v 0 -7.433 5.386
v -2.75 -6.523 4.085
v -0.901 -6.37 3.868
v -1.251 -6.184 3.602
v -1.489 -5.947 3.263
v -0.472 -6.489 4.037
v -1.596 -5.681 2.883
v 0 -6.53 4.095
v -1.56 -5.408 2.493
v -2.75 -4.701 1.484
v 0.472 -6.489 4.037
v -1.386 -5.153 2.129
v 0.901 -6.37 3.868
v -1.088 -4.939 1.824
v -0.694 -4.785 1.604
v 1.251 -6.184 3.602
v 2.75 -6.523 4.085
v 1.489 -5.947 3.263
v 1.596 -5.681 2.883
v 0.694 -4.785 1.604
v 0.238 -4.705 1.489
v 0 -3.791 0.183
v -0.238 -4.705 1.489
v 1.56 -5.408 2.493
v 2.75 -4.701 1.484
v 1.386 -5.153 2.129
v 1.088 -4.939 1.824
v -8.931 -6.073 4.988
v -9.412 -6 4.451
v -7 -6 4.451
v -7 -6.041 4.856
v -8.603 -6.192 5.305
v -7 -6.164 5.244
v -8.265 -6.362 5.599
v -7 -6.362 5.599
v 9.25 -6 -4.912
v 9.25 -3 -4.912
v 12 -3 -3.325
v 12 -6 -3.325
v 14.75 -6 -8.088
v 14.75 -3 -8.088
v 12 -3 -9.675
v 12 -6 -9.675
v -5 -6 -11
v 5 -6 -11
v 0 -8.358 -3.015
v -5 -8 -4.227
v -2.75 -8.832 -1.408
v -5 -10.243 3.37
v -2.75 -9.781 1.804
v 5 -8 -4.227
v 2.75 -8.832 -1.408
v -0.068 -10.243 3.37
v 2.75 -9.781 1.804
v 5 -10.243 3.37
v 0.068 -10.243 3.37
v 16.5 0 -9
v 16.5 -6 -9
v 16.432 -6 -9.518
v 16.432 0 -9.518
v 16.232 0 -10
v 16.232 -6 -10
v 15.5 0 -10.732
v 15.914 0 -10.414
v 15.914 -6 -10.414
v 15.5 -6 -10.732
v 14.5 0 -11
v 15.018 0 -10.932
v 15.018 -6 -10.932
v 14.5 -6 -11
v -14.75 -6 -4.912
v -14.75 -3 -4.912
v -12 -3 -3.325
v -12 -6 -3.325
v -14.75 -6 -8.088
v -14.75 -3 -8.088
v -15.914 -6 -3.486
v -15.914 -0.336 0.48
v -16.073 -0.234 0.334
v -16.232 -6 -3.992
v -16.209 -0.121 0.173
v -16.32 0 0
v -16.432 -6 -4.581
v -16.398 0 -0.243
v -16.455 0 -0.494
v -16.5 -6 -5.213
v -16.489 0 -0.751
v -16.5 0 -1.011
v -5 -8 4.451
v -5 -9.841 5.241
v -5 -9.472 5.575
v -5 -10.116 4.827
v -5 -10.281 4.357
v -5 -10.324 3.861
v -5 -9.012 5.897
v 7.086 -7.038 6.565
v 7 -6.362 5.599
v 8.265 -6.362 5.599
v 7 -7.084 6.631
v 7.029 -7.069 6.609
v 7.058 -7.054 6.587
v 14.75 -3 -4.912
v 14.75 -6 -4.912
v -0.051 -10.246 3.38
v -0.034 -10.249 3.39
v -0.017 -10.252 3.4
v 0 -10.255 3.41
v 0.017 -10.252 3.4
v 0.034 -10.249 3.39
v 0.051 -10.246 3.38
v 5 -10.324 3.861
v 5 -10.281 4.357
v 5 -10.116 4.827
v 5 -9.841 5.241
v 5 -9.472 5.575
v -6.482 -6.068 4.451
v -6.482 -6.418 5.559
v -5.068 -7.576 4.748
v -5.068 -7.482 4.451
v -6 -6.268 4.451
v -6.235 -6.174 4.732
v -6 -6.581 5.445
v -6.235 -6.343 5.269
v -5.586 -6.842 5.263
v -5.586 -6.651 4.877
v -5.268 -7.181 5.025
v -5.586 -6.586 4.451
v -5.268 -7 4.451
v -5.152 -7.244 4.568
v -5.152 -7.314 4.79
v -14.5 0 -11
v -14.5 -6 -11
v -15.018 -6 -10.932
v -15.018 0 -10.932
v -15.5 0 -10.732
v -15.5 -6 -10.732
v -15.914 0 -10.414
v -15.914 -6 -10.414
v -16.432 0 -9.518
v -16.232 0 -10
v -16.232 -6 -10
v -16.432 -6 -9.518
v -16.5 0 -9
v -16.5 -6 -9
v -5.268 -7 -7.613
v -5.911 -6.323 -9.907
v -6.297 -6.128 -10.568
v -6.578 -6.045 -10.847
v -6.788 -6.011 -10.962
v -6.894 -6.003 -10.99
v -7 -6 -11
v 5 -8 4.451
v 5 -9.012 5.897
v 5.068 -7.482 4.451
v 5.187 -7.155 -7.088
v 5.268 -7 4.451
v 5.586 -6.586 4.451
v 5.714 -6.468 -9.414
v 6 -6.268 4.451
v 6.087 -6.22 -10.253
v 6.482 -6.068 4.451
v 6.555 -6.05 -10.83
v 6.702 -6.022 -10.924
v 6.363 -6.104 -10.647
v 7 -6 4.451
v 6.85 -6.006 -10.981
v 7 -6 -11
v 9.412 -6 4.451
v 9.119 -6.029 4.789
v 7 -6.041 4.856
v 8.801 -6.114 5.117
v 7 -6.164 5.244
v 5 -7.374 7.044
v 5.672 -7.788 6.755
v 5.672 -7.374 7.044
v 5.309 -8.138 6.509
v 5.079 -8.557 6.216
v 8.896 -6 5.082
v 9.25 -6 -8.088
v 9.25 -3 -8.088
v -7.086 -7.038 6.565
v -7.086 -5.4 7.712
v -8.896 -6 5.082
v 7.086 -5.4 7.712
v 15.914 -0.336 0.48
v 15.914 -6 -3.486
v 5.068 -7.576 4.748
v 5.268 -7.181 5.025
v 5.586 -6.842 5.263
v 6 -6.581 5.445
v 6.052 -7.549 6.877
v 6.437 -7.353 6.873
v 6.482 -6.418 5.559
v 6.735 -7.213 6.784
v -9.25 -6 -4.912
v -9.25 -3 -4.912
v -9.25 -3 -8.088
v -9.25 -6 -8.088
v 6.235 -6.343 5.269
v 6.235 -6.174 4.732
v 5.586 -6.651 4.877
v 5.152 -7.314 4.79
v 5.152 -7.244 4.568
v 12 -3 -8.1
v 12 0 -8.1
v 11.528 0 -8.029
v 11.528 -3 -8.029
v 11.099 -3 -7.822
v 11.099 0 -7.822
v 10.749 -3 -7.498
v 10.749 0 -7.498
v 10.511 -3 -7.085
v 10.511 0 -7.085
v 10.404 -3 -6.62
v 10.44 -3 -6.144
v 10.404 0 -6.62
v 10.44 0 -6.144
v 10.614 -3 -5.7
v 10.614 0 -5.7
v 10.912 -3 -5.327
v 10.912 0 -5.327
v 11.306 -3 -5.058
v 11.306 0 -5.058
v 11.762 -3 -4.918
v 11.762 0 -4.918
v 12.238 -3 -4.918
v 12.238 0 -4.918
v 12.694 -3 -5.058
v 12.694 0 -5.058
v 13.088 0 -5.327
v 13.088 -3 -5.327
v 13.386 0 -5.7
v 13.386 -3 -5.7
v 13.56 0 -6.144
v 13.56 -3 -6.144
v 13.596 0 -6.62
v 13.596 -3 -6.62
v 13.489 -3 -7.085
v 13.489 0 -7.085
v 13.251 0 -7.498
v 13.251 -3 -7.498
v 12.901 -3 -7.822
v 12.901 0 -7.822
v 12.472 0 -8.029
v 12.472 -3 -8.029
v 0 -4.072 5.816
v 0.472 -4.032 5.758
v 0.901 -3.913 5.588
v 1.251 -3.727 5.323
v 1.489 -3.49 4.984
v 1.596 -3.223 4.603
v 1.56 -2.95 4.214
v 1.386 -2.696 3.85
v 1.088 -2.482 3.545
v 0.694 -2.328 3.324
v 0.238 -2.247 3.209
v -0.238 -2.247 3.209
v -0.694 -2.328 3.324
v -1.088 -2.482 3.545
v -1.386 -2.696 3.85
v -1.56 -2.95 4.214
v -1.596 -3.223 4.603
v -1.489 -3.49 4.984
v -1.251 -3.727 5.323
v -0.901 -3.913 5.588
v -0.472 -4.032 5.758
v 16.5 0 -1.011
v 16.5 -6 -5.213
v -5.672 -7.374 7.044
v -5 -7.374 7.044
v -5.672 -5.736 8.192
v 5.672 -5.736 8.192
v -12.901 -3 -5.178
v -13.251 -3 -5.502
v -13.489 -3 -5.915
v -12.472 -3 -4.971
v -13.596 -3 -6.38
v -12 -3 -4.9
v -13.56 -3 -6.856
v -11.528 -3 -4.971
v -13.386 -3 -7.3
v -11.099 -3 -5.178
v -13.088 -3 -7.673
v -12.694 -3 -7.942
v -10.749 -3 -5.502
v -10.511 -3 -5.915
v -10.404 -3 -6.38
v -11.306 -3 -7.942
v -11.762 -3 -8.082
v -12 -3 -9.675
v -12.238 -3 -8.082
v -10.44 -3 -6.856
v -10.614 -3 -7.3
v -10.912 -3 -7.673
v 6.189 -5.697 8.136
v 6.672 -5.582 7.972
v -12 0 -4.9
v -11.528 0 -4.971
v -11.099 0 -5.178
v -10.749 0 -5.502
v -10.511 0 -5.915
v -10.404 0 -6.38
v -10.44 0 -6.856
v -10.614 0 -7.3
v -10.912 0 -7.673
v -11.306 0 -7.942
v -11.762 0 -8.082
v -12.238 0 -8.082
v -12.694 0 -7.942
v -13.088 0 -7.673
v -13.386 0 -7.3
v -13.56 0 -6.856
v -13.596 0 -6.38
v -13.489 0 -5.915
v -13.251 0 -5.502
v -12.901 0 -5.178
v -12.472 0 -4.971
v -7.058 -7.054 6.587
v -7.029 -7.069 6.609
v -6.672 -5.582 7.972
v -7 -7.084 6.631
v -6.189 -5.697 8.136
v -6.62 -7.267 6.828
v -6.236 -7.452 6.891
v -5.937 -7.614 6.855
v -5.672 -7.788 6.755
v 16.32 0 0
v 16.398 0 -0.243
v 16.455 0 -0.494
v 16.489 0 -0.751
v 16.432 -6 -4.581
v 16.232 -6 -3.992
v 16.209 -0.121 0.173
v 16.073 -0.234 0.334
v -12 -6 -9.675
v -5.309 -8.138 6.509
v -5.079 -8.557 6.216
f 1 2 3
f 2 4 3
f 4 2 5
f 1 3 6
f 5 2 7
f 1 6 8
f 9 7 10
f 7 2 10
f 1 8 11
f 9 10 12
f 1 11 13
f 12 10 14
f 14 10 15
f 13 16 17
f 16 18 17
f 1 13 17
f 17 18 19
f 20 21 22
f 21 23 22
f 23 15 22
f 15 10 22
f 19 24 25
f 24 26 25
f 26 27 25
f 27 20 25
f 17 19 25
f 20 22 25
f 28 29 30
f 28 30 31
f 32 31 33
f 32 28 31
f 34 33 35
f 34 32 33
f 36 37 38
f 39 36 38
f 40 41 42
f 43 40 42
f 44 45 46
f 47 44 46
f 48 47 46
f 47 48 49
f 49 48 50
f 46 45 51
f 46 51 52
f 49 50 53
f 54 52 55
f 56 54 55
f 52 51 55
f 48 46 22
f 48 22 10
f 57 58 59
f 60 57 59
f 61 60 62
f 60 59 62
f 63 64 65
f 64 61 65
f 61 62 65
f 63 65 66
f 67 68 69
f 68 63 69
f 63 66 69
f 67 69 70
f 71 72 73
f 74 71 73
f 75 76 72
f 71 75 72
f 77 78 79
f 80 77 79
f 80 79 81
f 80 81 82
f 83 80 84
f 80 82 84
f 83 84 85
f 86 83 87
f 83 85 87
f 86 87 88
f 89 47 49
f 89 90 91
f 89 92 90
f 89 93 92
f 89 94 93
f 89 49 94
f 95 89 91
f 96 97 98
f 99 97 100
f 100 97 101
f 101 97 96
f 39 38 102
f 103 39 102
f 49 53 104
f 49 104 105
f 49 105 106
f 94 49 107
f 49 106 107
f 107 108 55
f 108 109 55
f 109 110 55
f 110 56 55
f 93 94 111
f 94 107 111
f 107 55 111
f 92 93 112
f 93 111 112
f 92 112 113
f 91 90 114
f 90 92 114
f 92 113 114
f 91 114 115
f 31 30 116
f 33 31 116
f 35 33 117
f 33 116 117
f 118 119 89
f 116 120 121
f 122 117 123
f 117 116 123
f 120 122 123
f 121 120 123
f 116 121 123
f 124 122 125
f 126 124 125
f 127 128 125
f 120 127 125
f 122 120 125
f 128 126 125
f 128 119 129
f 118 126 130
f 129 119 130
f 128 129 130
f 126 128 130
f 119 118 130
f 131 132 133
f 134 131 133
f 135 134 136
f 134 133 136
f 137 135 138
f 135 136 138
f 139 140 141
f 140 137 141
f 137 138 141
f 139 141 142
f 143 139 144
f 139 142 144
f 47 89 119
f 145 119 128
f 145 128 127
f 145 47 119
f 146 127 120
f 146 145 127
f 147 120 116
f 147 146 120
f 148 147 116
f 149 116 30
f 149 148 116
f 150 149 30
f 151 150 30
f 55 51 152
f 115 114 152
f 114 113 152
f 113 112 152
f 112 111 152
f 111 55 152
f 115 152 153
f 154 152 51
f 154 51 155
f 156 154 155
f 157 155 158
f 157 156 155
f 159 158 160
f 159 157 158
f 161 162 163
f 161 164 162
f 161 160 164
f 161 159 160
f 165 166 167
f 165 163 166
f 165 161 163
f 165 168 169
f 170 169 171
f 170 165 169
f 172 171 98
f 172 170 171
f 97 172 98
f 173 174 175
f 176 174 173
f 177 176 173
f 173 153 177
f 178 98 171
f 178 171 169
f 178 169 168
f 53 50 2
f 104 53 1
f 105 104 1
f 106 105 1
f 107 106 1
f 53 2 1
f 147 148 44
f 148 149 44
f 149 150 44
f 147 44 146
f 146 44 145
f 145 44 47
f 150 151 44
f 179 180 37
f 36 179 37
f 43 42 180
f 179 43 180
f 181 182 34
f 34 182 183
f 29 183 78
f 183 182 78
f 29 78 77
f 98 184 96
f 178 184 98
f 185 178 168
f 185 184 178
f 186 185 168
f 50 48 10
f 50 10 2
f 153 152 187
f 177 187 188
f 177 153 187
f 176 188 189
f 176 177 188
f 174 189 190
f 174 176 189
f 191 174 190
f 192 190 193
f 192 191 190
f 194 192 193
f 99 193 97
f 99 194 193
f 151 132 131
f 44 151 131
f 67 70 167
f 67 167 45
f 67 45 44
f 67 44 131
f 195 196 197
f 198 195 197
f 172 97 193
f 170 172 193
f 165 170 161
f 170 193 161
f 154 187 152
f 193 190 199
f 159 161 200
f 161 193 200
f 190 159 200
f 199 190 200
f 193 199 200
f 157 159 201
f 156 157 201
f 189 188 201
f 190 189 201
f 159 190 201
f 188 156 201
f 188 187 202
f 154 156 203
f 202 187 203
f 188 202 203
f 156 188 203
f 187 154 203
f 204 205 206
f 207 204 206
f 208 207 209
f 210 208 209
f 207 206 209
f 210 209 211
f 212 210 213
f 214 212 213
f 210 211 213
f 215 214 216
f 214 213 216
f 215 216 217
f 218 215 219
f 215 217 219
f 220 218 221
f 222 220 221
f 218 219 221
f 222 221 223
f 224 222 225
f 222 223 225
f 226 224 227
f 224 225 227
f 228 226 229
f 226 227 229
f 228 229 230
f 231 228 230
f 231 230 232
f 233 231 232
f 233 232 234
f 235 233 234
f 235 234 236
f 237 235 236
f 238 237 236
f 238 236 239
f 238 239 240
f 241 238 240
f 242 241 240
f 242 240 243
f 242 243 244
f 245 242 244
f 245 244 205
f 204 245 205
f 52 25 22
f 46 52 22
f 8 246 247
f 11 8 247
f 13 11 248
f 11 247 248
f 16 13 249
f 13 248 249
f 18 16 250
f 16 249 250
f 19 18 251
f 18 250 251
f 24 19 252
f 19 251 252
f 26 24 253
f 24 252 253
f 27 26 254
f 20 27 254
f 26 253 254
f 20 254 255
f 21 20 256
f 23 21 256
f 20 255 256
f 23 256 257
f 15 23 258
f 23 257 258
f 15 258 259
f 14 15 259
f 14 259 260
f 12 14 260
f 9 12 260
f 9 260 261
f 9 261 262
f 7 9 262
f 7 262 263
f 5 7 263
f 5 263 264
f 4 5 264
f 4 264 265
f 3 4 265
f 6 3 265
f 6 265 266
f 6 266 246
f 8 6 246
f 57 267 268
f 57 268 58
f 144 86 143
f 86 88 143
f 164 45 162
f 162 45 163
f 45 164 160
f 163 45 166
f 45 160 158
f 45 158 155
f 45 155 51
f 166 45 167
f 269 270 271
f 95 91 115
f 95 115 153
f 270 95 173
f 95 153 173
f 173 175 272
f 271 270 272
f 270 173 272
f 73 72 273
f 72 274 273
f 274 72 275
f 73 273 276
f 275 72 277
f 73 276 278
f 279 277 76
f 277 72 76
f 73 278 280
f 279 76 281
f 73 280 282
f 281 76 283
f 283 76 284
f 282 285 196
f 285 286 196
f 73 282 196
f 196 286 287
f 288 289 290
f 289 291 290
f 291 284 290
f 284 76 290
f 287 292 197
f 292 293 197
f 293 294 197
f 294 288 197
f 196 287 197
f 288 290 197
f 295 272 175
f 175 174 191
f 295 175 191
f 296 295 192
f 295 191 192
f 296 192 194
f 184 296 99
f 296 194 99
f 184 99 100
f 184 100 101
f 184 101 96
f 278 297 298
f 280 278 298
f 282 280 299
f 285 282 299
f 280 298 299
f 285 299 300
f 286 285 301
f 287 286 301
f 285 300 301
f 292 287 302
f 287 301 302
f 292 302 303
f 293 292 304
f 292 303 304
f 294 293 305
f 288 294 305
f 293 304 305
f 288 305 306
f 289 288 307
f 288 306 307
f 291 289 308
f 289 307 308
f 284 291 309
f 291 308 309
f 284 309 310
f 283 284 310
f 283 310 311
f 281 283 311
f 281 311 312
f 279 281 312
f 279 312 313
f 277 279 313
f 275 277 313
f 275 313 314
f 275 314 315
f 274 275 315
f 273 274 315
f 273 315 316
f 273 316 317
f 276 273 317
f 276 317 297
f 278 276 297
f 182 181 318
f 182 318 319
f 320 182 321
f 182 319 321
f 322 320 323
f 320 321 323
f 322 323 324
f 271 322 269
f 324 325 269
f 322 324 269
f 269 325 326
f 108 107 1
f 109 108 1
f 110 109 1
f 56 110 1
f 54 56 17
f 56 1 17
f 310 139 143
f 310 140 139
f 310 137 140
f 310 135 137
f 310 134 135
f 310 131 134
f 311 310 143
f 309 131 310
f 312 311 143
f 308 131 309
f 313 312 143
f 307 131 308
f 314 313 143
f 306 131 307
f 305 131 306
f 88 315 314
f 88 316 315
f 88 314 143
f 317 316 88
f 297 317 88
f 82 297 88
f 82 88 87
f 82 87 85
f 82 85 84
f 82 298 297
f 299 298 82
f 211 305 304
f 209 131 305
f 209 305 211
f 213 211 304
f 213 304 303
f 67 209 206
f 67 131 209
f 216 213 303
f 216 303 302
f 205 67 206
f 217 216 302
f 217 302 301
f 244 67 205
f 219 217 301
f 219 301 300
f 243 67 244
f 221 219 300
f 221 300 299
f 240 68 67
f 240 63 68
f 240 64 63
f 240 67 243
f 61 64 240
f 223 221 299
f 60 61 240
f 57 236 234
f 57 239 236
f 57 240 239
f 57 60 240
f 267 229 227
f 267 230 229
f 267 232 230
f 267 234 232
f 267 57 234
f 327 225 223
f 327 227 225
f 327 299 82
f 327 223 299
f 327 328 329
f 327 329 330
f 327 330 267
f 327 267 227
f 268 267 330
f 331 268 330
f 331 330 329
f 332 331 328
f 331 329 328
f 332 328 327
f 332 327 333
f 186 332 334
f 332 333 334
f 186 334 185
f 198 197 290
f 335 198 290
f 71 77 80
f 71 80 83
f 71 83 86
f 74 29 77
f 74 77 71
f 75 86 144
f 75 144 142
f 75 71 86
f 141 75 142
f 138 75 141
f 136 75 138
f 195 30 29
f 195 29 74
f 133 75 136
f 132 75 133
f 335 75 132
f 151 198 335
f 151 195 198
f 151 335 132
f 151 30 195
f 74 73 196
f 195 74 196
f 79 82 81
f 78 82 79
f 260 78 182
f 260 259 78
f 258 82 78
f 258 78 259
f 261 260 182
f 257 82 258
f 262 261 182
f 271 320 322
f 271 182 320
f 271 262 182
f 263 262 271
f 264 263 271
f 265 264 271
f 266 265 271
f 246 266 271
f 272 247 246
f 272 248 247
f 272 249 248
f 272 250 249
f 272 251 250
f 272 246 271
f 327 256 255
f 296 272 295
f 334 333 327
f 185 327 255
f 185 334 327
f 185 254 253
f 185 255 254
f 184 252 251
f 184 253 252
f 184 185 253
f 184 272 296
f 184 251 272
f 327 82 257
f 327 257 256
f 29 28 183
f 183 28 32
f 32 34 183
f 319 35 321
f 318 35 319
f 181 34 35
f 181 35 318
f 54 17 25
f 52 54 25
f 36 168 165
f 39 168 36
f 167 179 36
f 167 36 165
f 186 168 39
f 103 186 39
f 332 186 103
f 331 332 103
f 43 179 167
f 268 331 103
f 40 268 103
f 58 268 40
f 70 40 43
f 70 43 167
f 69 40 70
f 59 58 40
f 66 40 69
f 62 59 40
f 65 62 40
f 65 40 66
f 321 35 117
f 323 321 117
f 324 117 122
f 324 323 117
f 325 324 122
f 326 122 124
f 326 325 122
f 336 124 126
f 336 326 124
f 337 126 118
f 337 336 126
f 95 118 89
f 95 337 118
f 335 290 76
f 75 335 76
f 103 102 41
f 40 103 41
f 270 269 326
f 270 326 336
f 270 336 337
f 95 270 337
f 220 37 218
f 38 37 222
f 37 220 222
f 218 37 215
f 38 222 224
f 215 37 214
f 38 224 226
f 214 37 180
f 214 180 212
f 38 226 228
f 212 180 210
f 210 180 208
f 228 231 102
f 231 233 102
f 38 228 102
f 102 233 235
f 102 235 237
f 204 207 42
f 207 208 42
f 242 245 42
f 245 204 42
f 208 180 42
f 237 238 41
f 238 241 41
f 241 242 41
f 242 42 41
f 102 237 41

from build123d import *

# Parameters (mm, degrees)
EXTRU_MINCE1_DEPTH      = 16.5
ENL_V_MAT_EXTRU_5_DEPTH = 37.379072455
BOSS_EXTRU_1_DEPTH      = 5
ESQUISSE2_R             = 1.6
ENL_V_MAT_EXTRU_1_DEPTH = 23.509707076
ESQUISSE3_R             = 1.6
ENL_V_MAT_EXTRU_2_DEPTH = 23.509707076
ENL_V_START             = -3
ENL_V_MAT_EXTRU_3_DEPTH = 20.509707076
ENL_V_MAT_EXTRU_4_DEPTH = 20.509707076
CHANFREIN1_SIZE         = 10
CONG_1_R                = 2


with BuildPart() as part:
    # Esquisse1 → Extru.-Mince1 (new, symmetric)
    with BuildSketch(Plane(origin=(0, 0, 0), x_dir=(0, 0, -1), z_dir=(1, 0, 0))):
        Polygon((11, 0), (0, 0), (-8.191520443, -5.735764364), (-4.750061825, -10.650676629), (1.891792733, -6), (11, -6), align=None)
    extrude(amount=EXTRU_MINCE1_DEPTH, both=True)

    # Esquisse7 → Enlèv. mat.-Extru.5 (cut, through all)
    with BuildSketch(Plane.ZY.offset(16.5)):
        Polygon((-1.891792733, -6), (5.081994449, -6), (7.04436757, -7.374068452), (4.750061825, -10.650676629), align=None)
    extrude(amount=-ENL_V_MAT_EXTRU_5_DEPTH, mode=Mode.SUBTRACT)

    # Esquisse6 → Boss.-Extru.1 (add, symmetric)
    with BuildSketch(Plane(origin=(0, 0, 0), x_dir=(0, 0, -1), z_dir=(1, 0, 0))):
        Polygon((1.891792733, -6), (11, -6), (-4.750061825, -10.650676629), (-8.191520443, -5.735764364), (-5.081994449, -6), align=None)
    extrude(amount=BOSS_EXTRU_1_DEPTH, both=True)

    # Esquisse2 → Enlèv. mat.-Extru.1 (cut, through all)
    with BuildSketch(Plane(origin=(0, 0, 0), x_dir=(1, 0, 0), z_dir=(0, 1, 0))):
        with Locations(Location((-12, 6.5, 0), (0, 0, 270))):
            Circle(ESQUISSE2_R)
        with Locations(Location((12, 6.5, 0), (0, 0, 90))):
            Circle(ESQUISSE2_R)
    extrude(amount=-ENL_V_MAT_EXTRU_1_DEPTH, mode=Mode.SUBTRACT)

    # Esquisse3 → Enlèv. mat.-Extru.2 (cut, through all)
    with BuildSketch(Plane(origin=(0, 0, 0), x_dir=(1, 0, 0), z_dir=(0, 0.819152044288991, 0.5735764363510473))):
        with Locations(Location((0, -5.5, 0), (0, 0, 270))):
            Circle(ESQUISSE3_R)
    extrude(amount=-ENL_V_MAT_EXTRU_2_DEPTH, mode=Mode.SUBTRACT)

    # Esquisse4 → Enlèv. mat.-Extru.3 (cut, through all)
    with BuildSketch(Plane(origin=(0, 0, 0), x_dir=(1, 0, 0), z_dir=(0, 1, 0)).offset(ENL_V_START)):
        Polygon((-9.25, 8.08771324), (-12, 9.675426481), (-14.75, 8.08771324), (-14.75, 4.91228676), (-12, 3.324573519), (-9.25, 4.91228676), align=None)
        Polygon((14.75, 8.08771324), (12, 9.675426481), (9.25, 8.08771324), (9.25, 4.91228676), (12, 3.324573519), (14.75, 4.91228676), align=None)
    extrude(amount=-ENL_V_MAT_EXTRU_3_DEPTH, mode=Mode.SUBTRACT)

    # Esquisse5 → Enlèv. mat.-Extru.4 (cut, through all)
    with BuildSketch(Plane(origin=(0, 0, 0), x_dir=(1, 0, 0), z_dir=(0, 0.819152044288991, 0.5735764363510474)).offset(ENL_V_START)):
        Polygon((2.75, -3.91228676), (0, -2.324573519), (-2.75, -3.91228676), (-2.75, -7.08771324), (0, -8.675426481), (2.75, -7.08771324), align=None)
    extrude(amount=-ENL_V_MAT_EXTRU_4_DEPTH, mode=Mode.SUBTRACT)

    # Chanfrein1
    chanfrein1_edges = [part.edges().sort_by_distance(p)[0] for p in [
        (-16.5, -6.554916408, 7.617944007),
        (16.5, -6.554916408, 7.617944007),
    ]]
    chamfer(chanfrein1_edges, length=CHANFREIN1_SIZE)

    # Congé1
    # the kernel refuses this fillet: 2 mm, written as the material it adds along each edge
    with BuildSketch(Plane(origin=(7, -8, 4.451396871), x_dir=(0, 0.819152044288991, 0.5735764363510474), z_dir=(-1, 0, 0))) as cong_1_piece_1_section:
        Polygon((0, 0), (CONG_1_R, 0), (CONG_1_R, CONG_1_R * 0.315298788879), (CONG_1_R * 0.819152044289, CONG_1_R * 0.573576436351), align=None)
    cong_1_piece_1 = extrude(amount=CONG_1_R, mode=Mode.PRIVATE)
    cong_1_piece_1 = cong_1_piece_1 - Plane(origin=(7, -8, 4.451396871), x_dir=(0, -0.9537169507482266, -0.30070579950427384), z_dir=(-1, 0, 0)) * Sphere(CONG_1_R, mode=Mode.PRIVATE)
    add(cong_1_piece_1)
    with BuildSketch(Plane(origin=(-7, -8, 4.451396871), x_dir=(0, 1, 0), z_dir=(1, 0, 0))) as cong_1_piece_2_section:
        Polygon((0, 0), (CONG_1_R, 0), (CONG_1_R, CONG_1_R * 0.315298788879), (CONG_1_R * 0.819152044289, CONG_1_R * 0.573576436351), align=None)
    cong_1_piece_2 = extrude(amount=CONG_1_R, mode=Mode.PRIVATE)
    cong_1_piece_2 = cong_1_piece_2 - Plane(origin=(-7, -8, 4.451396871), x_dir=(0, -0.9537169507482266, -0.30070579950427384), z_dir=(1, 0, 0)) * Sphere(CONG_1_R, mode=Mode.PRIVATE)
    add(cong_1_piece_2)
    with BuildSketch(Plane(origin=(7, -6, 5.081994449), x_dir=(0, 0, -1), z_dir=(1, 0, 0))) as cong_1_piece_3_section:
        with BuildLine():
            CenterArc((CONG_1_R * 0.315298788879, -CONG_1_R), CONG_1_R, 90, 35)
            Line((-CONG_1_R * 0.258277647472, -CONG_1_R * 0.180847955711), (0, 0))
            Line((0, 0), (CONG_1_R * 0.315298788879, 0))
        make_face()
    cong_1_piece_3 = extrude(amount=3.472109184, mode=Mode.PRIVATE)
    cong_1_piece_3 = split(cong_1_piece_3, bisect_by=Plane(origin=(8.435798526, -6.333350621, 5.409912391), z_dir=(-0.7071067811865476, 0.40557978767263964, -0.5792279653395686)), keep=Keep.TOP, mode=Mode.PRIVATE)
    add(cong_1_piece_3)
    with BuildSketch(Plane(origin=(-10.472109184, -6, 5.081994449), x_dir=(0, 0, -1), z_dir=(1, 0, 0))) as cong_1_piece_4_section:
        with BuildLine():
            CenterArc((CONG_1_R * 0.315298788879, -CONG_1_R), CONG_1_R, 90, 35)
            Line((-CONG_1_R * 0.258277647472, -CONG_1_R * 0.180847955711), (0, 0))
            Line((0, 0), (CONG_1_R * 0.315298788879, 0))
        make_face()
    cong_1_piece_4 = extrude(amount=3.472109184, mode=Mode.PRIVATE)
    cong_1_piece_4 = split(cong_1_piece_4, bisect_by=Plane(origin=(-8.435798526, -6.333350621, 5.409912391), z_dir=(0.7071067811865476, 0.40557978767263964, -0.5792279653395686)), keep=Keep.TOP, mode=Mode.PRIVATE)
    add(cong_1_piece_4)
    with BuildSketch(Plane(origin=(-5, -7.374068452, 7.04436757), x_dir=(-1, 0, 0), z_dir=(0, 0.5735764363510474, -0.819152044288991))) as cong_1_piece_5_section:
        with BuildLine():
            CenterArc((CONG_1_R, -CONG_1_R), CONG_1_R, 90, 90)
            Line((0, -CONG_1_R), (0, 0))
            Line((0, 0), (CONG_1_R, 0))
        make_face()
    cong_1_piece_5 = extrude(amount=1.765017662, mode=Mode.PRIVATE)
    cong_1_piece_5 = split(cong_1_piece_5, bisect_by=Plane(origin=(-6.416553747, -7.794178032, 6.852072741), z_dir=(0.7071067811865476, 0.40557978767263964, -0.5792279653395686)), keep=Keep.TOP, mode=Mode.PRIVATE)
    add(cong_1_piece_5)
    with BuildSketch(Plane(origin=(5, -7.374068452, 7.04436757), x_dir=(1, 0, 0), z_dir=(0, 0.5735764363510474, -0.819152044288991))) as cong_1_piece_6_section:
        with BuildLine():
            CenterArc((CONG_1_R, CONG_1_R), CONG_1_R, 180, 90)
            Line((0, CONG_1_R), (0, 0))
            Line((0, 0), (CONG_1_R, 0))
        make_face()
    cong_1_piece_6 = extrude(amount=1.765017662, mode=Mode.PRIVATE)
    cong_1_piece_6 = split(cong_1_piece_6, bisect_by=Plane(origin=(6.416553747, -7.794178032, 6.852072741), z_dir=(-0.7071067811865476, 0.40557978767263964, -0.5792279653395686)), keep=Keep.TOP, mode=Mode.PRIVATE)
    add(cong_1_piece_6)
    with BuildSketch(Plane(origin=(5, -6, 4.451396871), x_dir=(1, 0, 0), z_dir=(0, 0, -1))) as cong_1_piece_7_section:
        with BuildLine():
            CenterArc((CONG_1_R, CONG_1_R), CONG_1_R, 180, 90)
            Line((0, CONG_1_R), (0, 0))
            Line((0, 0), (CONG_1_R, 0))
        make_face()
    cong_1_piece_7 = extrude(amount=15.451396871, mode=Mode.PRIVATE)
    cong_1_piece_7 = split(cong_1_piece_7, bisect_by=Plane(origin=(5.479319135, -8.319320936, -3.145347646), z_dir=(0, 0.9590632108966768, 0.2831920858791019)), keep=Keep.TOP, mode=Mode.PRIVATE)
    add(cong_1_piece_7)
    with BuildSketch(Plane(origin=(-5, -6, -11), x_dir=(-1, 0, 0), z_dir=(0, 0, 1))) as cong_1_piece_8_section:
        with BuildLine():
            CenterArc((CONG_1_R, CONG_1_R), CONG_1_R, 180, 90)
            Line((0, CONG_1_R), (0, 0))
            Line((0, 0), (CONG_1_R, 0))
        make_face()
    cong_1_piece_8 = extrude(amount=15.451396871, mode=Mode.PRIVATE)
    cong_1_piece_8 = split(cong_1_piece_8, bisect_by=Plane(origin=(-5.479319135, -8.319320936, -3.145347646), z_dir=(0, 0.9590632108966768, 0.2831920858791019)), keep=Keep.TOP, mode=Mode.PRIVATE)
    add(cong_1_piece_8)
    # the kernel refuses this fillet: 2 mm, written as the material it takes off along each edge
    with BuildSketch(Plane(origin=(-16.5, 1.696519432, 1.187915695), x_dir=(0, 0.5735764363510472, -0.8191520442889909), z_dir=(0, -0.819152044288991, -0.5735764363510473)), Plane(origin=(16.5, 1.696519432, 1.187915695), x_dir=(-0.7071067811865467, -0.40557978767264014, 0.5792279653395693), z_dir=(0, -0.819152044288991, -0.5735764363510473))) as cong_1_2_piece_1:
        with BuildLine():
            CenterArc((CONG_1_R * 0.414213562373, CONG_1_R), CONG_1_R, 225, 45)
            Line((-CONG_1_R * 0.292893218813, CONG_1_R * 0.292893218813), (0, 0))
            Line((0, 0), (CONG_1_R * 0.414213562373, 0))
        make_face()
    extrude(amount=11.466783156, mode=Mode.SUBTRACT)
    with BuildSketch(Plane(origin=(6.5, -9.12261086, 5.820024995), x_dir=(-1, 0, 0), z_dir=(0, 0.8191520442889916, 0.5735764363510465))) as cong_1_2_piece_2:
        with BuildLine():
            CenterArc((CONG_1_R * 0.414213562373, -CONG_1_R), CONG_1_R, 90, 45)
            Line((-CONG_1_R * 0.292893218813, -CONG_1_R * 0.292893218813), (0, 0))
            Line((0, 0), (CONG_1_R * 0.414213562373, 0))
        make_face()
    extrude(amount=6.205643951, mode=Mode.SUBTRACT)
    with BuildSketch(Plane(origin=(-6.5, -9.12261086, 5.820024995), x_dir=(1, 0, 0), z_dir=(-1.721686136418026e-15, 0.8191520442889914, 0.5735764363510468))) as cong_1_2_piece_3:
        with BuildLine():
            CenterArc((CONG_1_R * 0.414213562373, CONG_1_R), CONG_1_R, 225, 45)
            Line((-CONG_1_R * 0.292893218813, CONG_1_R * 0.292893218813), (0, 0))
            Line((0, 0), (CONG_1_R * 0.414213562373, 0))
        make_face()
    extrude(amount=6.205643951, mode=Mode.SUBTRACT)
    with BuildSketch(Plane(origin=(16.5, -11, -11), x_dir=(0, 0, 1), z_dir=(0, 1, 0))) as cong_1_2_piece_4:
        with BuildLine():
            CenterArc((CONG_1_R, -CONG_1_R), CONG_1_R, 90, 90)
            Line((0, -CONG_1_R), (0, 0))
            Line((0, 0), (CONG_1_R, 0))
        make_face()
    extrude(amount=16, mode=Mode.SUBTRACT)
    with BuildSketch(Plane(origin=(8.596227372, -10.650676629, 4.750061825), x_dir=(0, 0.2831920858791011, -0.9590632108966769), z_dir=(-1, 0, 0))) as cong_1_2_piece_5:
        with BuildLine():
            CenterArc((CONG_1_R * 0.719245474399, -CONG_1_R), CONG_1_R, 90, 71.450811124)
            Line((-CONG_1_R * 0.22880542283, -CONG_1_R * 0.681881317333), (0, 0))
            Line((0, 0), (CONG_1_R * 0.719245474399, 0))
        make_face()
    extrude(amount=17.192454744, mode=Mode.SUBTRACT)
    with BuildSketch(Plane(origin=(-16.5, -11, -11), x_dir=(0, 0, 1), z_dir=(0, 1, 0))) as cong_1_2_piece_6:
        with BuildLine():
            CenterArc((CONG_1_R, CONG_1_R), CONG_1_R, 180, 90)
            Line((0, CONG_1_R), (0, 0))
            Line((0, 0), (CONG_1_R, 0))
        make_face()
    extrude(amount=16, mode=Mode.SUBTRACT)


solid = part.part
